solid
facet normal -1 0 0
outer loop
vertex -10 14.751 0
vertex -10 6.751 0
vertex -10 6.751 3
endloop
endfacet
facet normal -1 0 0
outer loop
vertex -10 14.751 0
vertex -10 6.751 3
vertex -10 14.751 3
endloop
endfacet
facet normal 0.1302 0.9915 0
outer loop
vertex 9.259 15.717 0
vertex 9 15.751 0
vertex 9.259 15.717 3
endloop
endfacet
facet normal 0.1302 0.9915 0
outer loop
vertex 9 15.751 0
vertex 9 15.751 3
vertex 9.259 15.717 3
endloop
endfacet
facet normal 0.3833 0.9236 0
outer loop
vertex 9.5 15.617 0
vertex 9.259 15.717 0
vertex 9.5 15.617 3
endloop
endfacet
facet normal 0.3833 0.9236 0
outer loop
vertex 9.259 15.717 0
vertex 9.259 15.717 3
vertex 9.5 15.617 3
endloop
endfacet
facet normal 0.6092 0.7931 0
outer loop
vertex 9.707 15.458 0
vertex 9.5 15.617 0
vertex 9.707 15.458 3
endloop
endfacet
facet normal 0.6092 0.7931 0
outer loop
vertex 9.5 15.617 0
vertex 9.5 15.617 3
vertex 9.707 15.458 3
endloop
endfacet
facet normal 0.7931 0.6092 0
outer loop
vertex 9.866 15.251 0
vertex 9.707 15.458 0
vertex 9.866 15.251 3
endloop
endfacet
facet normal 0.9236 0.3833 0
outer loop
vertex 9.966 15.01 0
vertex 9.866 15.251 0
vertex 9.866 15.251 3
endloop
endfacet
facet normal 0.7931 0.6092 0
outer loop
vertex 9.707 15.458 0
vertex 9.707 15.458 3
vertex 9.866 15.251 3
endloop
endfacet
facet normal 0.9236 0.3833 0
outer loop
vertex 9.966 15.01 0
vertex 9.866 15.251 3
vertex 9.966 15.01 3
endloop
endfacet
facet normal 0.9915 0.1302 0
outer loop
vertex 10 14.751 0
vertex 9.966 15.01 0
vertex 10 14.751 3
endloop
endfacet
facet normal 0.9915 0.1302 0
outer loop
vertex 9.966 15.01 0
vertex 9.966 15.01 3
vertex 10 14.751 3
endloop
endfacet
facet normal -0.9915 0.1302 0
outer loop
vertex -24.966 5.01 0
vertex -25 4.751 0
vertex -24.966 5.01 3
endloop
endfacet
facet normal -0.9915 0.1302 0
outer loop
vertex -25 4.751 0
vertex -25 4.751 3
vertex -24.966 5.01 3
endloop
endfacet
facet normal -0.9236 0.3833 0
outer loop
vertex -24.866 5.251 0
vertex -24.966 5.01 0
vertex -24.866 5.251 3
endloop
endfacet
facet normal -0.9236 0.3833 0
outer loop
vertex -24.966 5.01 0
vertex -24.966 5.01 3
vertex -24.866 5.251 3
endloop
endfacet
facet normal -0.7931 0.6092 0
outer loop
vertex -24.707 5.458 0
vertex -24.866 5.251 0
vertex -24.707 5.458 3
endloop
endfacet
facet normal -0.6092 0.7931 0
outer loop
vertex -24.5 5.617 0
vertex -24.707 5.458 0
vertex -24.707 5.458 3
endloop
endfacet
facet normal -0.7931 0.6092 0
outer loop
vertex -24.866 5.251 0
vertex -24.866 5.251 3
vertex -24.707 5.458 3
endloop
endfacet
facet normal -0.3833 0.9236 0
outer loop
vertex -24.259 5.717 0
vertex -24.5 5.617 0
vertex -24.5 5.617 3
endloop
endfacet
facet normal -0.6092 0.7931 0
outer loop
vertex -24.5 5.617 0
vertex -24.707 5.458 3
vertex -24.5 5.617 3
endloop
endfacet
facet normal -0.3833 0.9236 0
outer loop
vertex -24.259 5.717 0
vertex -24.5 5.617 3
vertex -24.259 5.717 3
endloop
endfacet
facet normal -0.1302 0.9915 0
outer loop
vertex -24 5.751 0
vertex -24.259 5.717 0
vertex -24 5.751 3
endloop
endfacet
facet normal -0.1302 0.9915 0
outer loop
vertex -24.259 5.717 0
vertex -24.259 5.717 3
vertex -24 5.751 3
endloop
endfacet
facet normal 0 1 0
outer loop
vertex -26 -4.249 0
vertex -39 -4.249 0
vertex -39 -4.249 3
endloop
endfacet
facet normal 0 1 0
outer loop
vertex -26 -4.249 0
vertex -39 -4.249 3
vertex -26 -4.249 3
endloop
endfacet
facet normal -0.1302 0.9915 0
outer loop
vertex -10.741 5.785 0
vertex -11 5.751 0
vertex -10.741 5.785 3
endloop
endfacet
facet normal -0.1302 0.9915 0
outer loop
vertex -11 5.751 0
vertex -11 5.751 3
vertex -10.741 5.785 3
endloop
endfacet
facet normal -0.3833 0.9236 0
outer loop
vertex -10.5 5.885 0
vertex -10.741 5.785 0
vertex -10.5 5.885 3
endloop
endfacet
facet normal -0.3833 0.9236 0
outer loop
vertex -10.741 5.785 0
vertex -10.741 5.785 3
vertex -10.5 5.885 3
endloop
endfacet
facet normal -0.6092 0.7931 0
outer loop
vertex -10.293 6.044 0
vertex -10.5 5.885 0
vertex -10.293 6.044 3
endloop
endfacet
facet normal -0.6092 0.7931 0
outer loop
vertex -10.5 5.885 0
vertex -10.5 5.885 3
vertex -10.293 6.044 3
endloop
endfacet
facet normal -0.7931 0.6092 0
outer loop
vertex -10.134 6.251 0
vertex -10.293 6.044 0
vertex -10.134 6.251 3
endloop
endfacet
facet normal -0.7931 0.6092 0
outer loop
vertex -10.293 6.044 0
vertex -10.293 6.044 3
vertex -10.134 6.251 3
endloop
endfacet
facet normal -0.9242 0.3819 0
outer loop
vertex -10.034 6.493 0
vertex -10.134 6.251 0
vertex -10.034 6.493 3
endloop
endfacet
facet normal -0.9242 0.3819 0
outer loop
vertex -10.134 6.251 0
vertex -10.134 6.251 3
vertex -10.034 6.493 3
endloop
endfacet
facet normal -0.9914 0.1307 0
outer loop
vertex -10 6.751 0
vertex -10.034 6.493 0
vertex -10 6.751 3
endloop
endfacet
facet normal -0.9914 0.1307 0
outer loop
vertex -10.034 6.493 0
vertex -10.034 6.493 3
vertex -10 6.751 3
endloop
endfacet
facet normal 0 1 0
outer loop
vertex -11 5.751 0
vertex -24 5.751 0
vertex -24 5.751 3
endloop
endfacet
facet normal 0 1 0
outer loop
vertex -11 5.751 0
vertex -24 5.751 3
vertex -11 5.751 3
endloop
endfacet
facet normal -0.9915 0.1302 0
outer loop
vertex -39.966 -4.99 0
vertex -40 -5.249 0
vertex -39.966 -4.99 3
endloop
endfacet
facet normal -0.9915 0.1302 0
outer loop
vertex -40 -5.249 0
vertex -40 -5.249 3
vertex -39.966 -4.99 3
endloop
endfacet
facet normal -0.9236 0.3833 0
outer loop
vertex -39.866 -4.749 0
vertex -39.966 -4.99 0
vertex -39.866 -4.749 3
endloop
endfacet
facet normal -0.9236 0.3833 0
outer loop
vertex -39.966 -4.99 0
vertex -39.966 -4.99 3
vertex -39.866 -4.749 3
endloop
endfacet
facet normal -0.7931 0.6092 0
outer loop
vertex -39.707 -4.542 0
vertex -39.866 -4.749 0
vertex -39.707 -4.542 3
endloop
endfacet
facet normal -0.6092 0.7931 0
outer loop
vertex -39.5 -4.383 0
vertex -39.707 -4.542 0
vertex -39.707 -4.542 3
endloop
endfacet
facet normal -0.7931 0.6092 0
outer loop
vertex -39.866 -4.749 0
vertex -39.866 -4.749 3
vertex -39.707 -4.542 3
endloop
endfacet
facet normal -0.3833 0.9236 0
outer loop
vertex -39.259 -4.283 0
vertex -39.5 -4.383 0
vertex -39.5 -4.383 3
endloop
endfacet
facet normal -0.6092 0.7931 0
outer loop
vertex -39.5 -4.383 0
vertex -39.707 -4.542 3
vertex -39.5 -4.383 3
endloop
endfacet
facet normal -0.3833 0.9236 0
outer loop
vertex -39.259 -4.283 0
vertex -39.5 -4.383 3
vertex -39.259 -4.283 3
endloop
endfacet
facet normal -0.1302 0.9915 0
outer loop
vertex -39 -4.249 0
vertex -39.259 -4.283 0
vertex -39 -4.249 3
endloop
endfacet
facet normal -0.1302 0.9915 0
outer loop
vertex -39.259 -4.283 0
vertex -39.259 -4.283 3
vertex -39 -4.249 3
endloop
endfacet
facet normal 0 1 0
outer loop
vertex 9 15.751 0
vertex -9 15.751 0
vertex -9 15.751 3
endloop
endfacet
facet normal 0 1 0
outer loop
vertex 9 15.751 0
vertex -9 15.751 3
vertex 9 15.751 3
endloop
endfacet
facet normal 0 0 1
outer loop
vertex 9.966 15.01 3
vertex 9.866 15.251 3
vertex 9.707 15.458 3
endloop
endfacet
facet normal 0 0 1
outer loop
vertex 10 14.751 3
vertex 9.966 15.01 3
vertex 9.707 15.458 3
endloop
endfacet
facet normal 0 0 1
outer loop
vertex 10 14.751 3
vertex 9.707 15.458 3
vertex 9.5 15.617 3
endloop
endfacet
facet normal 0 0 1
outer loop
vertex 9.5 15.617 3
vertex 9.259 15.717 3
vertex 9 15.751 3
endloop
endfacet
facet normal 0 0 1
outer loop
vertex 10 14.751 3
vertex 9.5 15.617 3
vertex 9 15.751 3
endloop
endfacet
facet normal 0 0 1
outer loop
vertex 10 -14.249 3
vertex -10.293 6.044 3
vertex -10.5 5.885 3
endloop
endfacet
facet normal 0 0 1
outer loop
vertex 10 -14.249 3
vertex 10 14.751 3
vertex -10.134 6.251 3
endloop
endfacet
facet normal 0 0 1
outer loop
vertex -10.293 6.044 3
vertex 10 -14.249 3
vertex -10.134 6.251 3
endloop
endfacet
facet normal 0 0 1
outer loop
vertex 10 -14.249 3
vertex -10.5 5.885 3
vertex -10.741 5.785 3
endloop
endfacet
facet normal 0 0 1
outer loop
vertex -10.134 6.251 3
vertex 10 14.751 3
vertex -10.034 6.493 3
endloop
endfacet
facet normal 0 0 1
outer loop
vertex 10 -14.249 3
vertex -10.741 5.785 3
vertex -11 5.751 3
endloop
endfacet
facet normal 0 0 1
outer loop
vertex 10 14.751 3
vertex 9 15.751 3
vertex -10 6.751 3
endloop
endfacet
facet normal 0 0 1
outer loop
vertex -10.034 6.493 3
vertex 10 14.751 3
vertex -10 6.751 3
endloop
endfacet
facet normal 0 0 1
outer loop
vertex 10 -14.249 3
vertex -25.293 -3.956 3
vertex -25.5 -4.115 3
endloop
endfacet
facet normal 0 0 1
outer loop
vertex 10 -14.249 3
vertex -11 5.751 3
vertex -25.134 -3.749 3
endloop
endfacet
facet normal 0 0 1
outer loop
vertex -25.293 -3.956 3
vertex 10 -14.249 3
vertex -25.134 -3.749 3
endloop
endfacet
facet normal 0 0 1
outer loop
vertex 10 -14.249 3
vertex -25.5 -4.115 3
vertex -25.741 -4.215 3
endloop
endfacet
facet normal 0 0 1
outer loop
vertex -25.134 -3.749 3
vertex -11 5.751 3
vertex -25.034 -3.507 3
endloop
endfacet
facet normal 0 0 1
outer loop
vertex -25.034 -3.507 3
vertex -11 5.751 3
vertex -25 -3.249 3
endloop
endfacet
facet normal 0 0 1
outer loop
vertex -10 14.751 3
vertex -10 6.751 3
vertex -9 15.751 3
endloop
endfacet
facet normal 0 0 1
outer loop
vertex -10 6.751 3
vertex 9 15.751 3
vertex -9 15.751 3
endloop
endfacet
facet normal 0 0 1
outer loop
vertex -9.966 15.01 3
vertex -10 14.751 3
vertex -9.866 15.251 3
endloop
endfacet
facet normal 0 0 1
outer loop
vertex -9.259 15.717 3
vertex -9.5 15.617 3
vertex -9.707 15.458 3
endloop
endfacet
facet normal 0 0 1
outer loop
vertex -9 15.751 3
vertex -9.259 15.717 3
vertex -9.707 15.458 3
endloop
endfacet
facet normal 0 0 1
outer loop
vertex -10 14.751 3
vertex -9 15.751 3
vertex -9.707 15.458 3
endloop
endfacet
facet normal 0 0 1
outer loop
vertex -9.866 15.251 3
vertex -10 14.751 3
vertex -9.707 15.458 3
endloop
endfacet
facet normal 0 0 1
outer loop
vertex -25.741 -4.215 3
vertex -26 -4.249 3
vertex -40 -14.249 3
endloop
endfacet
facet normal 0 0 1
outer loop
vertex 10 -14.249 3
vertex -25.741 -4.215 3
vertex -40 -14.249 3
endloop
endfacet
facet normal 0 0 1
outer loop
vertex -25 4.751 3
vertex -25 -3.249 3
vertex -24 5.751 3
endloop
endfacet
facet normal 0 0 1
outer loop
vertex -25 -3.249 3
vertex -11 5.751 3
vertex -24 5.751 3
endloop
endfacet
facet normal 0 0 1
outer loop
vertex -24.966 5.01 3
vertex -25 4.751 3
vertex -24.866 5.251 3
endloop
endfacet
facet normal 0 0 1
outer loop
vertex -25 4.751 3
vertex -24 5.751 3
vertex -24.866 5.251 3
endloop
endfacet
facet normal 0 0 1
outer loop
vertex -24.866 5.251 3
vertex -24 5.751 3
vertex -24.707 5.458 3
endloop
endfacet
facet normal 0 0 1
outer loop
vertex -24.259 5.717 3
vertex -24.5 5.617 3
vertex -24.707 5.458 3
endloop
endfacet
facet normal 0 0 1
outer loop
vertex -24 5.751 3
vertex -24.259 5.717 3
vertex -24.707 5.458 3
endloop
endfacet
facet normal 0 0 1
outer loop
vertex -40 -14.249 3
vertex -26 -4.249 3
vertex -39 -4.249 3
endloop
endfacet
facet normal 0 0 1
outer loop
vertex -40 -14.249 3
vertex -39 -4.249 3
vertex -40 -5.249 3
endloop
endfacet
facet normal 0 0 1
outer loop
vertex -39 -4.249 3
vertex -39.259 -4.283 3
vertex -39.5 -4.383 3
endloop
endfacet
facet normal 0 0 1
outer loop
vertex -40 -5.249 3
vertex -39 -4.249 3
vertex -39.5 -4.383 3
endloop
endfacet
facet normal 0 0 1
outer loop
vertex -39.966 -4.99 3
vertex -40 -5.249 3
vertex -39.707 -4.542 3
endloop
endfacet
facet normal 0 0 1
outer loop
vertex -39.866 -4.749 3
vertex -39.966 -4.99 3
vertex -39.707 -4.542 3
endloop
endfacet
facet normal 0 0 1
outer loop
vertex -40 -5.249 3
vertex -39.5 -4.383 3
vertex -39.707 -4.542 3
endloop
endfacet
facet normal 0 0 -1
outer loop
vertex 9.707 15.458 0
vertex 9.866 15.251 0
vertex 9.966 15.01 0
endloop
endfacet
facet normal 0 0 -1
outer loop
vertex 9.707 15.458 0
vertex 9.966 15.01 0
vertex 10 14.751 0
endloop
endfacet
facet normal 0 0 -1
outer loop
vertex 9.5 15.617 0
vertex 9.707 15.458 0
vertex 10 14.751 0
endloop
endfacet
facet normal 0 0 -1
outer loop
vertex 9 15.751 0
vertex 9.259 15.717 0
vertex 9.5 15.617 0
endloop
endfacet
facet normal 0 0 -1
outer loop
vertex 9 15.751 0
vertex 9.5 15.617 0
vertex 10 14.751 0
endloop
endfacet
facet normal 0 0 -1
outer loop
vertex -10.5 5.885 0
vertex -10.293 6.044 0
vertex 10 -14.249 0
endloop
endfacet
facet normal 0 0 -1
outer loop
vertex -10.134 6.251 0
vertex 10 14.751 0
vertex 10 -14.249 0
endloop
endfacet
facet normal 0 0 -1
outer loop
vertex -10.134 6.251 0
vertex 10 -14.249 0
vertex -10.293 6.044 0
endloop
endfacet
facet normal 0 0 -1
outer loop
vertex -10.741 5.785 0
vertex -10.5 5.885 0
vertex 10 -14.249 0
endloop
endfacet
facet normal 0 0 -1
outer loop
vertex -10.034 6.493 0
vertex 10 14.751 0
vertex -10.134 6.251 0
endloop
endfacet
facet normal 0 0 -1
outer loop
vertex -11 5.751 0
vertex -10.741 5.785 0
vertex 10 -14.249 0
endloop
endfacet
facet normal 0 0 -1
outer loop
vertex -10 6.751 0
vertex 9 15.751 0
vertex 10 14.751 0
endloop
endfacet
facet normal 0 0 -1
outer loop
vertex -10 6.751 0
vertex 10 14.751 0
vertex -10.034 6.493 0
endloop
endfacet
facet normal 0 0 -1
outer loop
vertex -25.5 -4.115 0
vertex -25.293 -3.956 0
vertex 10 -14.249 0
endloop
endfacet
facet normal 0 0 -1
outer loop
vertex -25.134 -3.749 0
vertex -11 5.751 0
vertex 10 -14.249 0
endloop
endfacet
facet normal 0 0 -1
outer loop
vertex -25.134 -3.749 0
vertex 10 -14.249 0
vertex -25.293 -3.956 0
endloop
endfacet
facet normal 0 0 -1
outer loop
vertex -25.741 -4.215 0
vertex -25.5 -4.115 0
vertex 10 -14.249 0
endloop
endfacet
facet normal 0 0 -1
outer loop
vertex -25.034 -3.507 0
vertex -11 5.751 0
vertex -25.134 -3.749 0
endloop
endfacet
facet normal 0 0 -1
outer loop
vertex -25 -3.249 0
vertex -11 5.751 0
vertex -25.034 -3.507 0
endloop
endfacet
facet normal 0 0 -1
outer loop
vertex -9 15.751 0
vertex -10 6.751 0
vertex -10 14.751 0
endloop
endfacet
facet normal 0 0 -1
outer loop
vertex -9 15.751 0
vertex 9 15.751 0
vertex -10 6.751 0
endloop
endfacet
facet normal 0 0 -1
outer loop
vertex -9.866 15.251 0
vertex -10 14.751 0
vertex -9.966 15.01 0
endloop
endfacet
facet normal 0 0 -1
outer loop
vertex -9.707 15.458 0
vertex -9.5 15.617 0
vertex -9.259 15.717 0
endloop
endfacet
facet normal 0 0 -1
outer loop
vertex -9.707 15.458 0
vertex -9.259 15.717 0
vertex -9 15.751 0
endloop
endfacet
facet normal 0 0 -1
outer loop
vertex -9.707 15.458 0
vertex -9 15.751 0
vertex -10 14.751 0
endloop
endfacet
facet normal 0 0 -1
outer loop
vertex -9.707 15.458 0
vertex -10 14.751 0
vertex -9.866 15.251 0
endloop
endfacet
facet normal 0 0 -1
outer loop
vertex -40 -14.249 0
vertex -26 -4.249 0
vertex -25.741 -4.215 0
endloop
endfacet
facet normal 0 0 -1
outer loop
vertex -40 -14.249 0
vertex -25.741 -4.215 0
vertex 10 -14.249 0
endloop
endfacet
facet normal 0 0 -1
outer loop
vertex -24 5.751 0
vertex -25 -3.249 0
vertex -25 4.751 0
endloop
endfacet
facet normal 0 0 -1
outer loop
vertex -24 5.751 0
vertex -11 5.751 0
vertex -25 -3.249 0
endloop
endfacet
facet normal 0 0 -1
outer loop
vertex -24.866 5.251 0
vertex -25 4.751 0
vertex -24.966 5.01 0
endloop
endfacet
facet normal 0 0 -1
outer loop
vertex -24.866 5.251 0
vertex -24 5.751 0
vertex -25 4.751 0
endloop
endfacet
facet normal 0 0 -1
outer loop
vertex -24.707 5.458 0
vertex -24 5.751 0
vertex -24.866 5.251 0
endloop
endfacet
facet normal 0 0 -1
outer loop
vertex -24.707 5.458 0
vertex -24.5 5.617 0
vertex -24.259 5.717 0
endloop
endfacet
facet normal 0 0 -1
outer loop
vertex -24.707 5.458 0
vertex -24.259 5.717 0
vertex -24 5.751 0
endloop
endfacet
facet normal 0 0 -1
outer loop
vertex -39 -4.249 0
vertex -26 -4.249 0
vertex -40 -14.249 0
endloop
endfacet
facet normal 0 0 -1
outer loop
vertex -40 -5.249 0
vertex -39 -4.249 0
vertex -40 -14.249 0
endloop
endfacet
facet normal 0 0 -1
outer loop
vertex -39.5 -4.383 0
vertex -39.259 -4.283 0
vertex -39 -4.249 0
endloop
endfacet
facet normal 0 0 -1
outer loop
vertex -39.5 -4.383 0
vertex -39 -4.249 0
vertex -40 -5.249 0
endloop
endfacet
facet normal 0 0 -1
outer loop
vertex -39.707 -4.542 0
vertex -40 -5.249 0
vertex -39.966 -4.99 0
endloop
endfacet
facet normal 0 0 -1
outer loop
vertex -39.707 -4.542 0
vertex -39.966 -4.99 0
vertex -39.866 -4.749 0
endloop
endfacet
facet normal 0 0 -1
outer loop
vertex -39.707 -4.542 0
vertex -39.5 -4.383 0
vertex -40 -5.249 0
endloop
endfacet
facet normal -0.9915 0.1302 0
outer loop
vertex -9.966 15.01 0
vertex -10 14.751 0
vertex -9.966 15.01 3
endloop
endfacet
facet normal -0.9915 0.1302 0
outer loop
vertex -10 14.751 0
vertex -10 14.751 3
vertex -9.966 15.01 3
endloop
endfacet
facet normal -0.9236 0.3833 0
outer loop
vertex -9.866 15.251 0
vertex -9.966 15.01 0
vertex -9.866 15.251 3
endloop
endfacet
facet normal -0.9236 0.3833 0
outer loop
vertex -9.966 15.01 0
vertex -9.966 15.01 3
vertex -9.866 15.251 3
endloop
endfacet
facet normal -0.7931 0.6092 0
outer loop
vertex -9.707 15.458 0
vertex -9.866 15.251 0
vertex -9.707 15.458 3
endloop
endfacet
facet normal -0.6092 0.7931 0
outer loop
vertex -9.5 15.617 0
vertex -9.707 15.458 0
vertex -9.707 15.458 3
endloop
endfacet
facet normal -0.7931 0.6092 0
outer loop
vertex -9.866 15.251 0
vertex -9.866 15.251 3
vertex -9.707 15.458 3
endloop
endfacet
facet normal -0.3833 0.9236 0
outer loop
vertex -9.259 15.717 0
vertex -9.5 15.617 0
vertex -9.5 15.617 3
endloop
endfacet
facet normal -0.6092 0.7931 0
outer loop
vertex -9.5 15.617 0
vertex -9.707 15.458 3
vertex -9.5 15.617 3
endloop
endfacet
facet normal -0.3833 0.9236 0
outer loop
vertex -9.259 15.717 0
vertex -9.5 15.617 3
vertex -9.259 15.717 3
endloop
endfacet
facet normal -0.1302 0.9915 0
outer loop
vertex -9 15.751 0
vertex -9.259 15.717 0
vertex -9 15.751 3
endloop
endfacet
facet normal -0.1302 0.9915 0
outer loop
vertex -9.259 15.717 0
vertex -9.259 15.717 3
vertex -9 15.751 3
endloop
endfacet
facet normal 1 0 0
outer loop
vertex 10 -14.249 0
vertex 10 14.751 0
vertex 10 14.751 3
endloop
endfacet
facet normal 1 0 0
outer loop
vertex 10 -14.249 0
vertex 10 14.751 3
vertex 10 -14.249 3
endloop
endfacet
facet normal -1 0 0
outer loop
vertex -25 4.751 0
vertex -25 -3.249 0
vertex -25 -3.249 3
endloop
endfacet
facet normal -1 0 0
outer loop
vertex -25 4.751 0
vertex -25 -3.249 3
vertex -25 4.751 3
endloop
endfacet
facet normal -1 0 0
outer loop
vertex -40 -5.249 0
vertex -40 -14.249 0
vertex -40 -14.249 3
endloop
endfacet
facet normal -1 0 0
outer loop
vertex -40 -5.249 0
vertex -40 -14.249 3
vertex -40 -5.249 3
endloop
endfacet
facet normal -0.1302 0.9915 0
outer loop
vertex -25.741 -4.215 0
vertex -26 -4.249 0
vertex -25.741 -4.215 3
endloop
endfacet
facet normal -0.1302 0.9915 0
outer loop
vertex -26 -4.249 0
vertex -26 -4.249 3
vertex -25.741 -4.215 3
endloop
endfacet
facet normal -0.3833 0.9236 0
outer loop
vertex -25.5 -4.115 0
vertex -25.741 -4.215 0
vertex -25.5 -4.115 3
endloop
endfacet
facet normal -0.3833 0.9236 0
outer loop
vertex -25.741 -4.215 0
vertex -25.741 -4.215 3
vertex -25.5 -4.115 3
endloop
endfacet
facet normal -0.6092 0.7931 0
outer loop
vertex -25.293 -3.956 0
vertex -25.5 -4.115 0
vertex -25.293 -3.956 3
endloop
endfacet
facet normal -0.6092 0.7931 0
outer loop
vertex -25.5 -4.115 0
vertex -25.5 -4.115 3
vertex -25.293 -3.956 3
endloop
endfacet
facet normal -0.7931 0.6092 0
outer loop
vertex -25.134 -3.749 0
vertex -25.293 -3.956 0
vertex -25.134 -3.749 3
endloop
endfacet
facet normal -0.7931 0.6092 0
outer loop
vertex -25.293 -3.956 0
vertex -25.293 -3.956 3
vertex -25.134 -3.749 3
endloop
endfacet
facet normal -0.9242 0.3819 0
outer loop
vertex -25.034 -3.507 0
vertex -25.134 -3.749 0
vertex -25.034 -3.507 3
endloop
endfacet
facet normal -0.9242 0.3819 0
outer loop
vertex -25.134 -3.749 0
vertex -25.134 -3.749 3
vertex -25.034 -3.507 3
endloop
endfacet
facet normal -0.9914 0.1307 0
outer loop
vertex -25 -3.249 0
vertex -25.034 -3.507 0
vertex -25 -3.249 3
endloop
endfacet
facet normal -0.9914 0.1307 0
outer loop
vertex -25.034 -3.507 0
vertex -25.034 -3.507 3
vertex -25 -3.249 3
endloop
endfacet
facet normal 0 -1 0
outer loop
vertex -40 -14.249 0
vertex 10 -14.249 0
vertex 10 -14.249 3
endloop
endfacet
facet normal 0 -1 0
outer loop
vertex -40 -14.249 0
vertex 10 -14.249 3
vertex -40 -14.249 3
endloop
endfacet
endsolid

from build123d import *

# Parameters (mm, degrees)
PAD_DEPTH   = 3
FILLET_R    = 1
FILLET001_R = 1
FILLET002_R = 1
FILLET003_R = 1
FILLET004_R = 1
FILLET005_R = 1


with BuildPart() as part:
    # Sketch → Pad (new body)
    with BuildSketch(Plane.XY):
        Polygon((-10, 15.751367), (10, 15.751367), (10, -14.248633), (-40, -14.248633), (-40, -4.248633), (-25, -4.248633), (-25, 5.751367), (-10, 5.751367), align=None)
    extrude(amount=PAD_DEPTH)

    # Fillet
    fillet_edges = [part.edges().sort_by_distance(p)[0] for p in [
        (-40, -4.248633, 1.5),
    ]]
    fillet(fillet_edges, radius=FILLET_R)

    # Fillet001
    fillet001_edges = [part.edges().sort_by_distance(p)[0] for p in [
        (-25, -4.248633, 1.5),
    ]]
    fillet(fillet001_edges, radius=FILLET001_R)

    # Fillet002
    fillet002_edges = [part.edges().sort_by_distance(p)[0] for p in [
        (-25, 5.751367, 1.5),
    ]]
    fillet(fillet002_edges, radius=FILLET002_R)

    # Fillet003
    fillet003_edges = [part.edges().sort_by_distance(p)[0] for p in [
        (-10, 5.751367, 1.5),
    ]]
    fillet(fillet003_edges, radius=FILLET003_R)

    # Fillet004
    fillet004_edges = [part.edges().sort_by_distance(p)[0] for p in [
        (-10, 15.751367, 1.5),
    ]]
    fillet(fillet004_edges, radius=FILLET004_R)

    # Fillet005
    fillet005_edges = [part.edges().sort_by_distance(p)[0] for p in [
        (10, 15.751367, 1.5),
    ]]
    fillet(fillet005_edges, radius=FILLET005_R)


solid = part.part
